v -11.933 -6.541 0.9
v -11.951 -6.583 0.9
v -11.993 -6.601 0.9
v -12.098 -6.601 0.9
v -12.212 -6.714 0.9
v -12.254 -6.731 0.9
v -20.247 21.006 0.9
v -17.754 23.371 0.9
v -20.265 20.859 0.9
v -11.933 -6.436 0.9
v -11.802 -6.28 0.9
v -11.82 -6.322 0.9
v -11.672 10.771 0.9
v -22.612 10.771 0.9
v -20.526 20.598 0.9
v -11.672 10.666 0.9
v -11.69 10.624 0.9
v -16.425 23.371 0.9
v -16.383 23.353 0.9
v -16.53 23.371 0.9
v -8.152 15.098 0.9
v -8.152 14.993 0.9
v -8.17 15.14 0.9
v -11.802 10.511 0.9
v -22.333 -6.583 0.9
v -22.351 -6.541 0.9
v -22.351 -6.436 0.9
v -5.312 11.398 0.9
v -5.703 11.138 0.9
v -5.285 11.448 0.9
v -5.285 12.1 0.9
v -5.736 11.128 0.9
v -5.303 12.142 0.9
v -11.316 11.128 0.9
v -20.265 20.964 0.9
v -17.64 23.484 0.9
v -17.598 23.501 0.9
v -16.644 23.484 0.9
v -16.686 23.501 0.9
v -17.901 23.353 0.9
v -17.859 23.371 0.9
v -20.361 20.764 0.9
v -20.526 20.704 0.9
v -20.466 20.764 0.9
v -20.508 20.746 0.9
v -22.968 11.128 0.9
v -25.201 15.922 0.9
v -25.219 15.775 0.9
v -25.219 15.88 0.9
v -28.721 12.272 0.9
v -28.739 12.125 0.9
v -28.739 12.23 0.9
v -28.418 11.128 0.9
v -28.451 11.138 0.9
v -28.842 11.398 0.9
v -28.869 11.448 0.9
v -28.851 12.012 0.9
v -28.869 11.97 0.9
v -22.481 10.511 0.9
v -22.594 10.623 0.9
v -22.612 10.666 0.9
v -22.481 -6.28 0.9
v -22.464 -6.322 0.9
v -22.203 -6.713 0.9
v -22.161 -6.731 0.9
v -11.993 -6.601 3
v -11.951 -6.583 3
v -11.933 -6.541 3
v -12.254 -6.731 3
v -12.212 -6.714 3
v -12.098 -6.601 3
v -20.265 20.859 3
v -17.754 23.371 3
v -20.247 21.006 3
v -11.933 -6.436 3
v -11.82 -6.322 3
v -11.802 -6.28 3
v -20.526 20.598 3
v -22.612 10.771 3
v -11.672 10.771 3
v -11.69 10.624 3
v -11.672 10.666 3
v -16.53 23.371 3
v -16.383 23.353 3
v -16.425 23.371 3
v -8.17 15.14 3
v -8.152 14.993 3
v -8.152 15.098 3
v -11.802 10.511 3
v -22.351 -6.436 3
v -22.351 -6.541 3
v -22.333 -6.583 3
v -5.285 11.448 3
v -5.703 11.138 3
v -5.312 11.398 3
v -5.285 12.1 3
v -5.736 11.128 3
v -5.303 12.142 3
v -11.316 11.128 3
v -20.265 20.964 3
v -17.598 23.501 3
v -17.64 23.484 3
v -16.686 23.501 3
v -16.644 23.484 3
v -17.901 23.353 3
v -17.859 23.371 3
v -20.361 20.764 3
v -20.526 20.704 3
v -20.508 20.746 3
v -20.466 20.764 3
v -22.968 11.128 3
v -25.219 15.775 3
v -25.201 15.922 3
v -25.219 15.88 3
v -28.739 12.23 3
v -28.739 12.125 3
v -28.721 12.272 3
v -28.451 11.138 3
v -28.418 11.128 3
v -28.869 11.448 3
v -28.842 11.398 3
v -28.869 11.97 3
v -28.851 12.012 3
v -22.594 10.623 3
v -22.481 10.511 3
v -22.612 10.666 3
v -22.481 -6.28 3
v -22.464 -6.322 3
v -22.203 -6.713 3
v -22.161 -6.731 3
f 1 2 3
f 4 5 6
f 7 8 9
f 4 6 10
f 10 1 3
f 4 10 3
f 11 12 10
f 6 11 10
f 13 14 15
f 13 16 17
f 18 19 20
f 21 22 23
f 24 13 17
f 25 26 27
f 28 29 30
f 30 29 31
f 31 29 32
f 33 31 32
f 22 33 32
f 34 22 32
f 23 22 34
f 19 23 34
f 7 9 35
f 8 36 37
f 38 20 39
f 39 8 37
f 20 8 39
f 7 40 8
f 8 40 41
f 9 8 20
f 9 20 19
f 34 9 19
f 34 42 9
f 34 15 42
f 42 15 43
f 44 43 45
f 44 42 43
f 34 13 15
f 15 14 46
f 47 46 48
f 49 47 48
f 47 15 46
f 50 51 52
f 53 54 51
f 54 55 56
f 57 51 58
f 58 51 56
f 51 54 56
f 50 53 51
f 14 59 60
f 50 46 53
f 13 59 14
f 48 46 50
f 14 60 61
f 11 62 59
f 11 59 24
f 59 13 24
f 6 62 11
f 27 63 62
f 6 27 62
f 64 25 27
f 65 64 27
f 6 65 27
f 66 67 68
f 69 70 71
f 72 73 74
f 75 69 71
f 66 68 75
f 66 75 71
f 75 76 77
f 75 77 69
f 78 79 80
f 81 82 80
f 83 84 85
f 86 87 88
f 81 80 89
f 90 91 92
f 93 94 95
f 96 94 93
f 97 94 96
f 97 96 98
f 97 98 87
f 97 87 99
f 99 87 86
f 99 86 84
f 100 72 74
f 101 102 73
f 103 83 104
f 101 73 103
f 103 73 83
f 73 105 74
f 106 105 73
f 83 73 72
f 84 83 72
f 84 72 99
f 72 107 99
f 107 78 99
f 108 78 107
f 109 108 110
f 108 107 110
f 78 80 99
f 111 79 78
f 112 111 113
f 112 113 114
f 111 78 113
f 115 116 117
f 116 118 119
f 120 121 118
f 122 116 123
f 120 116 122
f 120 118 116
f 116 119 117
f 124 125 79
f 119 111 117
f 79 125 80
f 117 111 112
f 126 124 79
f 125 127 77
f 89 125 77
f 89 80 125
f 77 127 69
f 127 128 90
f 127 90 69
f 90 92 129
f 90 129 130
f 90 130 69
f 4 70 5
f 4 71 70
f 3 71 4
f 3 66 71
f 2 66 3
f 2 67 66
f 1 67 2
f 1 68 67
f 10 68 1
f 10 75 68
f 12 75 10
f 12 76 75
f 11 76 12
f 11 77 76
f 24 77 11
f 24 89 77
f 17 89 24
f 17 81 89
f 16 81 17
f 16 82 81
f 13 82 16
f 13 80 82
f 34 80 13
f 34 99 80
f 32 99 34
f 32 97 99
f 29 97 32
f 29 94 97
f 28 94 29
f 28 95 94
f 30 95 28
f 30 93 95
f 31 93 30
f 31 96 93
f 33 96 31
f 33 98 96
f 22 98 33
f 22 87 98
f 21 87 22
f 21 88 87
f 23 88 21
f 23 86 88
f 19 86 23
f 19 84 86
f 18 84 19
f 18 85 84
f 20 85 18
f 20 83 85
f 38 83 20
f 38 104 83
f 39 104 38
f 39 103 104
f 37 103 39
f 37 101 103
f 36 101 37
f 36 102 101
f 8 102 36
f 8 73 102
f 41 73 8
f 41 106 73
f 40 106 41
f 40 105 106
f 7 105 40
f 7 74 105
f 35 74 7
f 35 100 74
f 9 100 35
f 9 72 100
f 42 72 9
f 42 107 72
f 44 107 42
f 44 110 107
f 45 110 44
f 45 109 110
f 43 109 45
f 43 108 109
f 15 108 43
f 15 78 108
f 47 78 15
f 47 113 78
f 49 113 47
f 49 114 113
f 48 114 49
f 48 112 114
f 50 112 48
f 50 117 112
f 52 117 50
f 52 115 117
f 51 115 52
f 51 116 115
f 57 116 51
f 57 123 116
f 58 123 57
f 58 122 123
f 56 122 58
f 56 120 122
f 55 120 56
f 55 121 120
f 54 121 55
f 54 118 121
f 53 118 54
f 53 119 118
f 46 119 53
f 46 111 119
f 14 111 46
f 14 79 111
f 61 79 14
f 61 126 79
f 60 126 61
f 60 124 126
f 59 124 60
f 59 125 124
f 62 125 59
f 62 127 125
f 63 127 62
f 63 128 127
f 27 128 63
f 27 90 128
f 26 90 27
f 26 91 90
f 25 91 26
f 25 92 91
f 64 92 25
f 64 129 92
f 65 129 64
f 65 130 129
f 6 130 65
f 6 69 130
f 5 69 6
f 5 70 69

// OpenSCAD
$fn = 24;
translate([0, -2.500, 0.900])
  linear_extrude(height=2.100) {
offset(r=0.06, $fn=8) {
    polygon(points=[[-17.598,25.941],[-17.729,25.811],[-17.859,25.811],[-20.205,23.464],[-20.205,23.334],[-20.336,23.204],[-20.466,23.204],[-20.466,23.073],[-25.159,18.380],[-25.159,18.250],[-28.679,14.730],[-28.679,14.600],[-28.809,14.470],[-28.809,13.948],[-28.418,13.688],[-22.943,13.688],[-22.552,13.296],[-22.552,13.166],[-22.421,13.036],[-22.421,-3.780],[-22.291,-3.911],[-22.291,-4.041],[-22.161,-4.171],[-12.254,-4.171],[-12.123,-4.041],[-11.993,-4.041],[-11.993,-3.911],[-11.862,-3.780],[-11.862,13.036],[-11.732,13.166],[-11.732,13.296],[-11.341,13.688],[-5.736,13.688],[-5.345,13.948],[-5.345,14.600],[-8.212,17.468],[-8.212,17.598],[-16.425,25.811],[-16.555,25.811],[-16.686,25.941]], paths=[[0,1,2,3,4,5,6,7,8,9,10,11,12,13,14,15,16,17,18,19,20,21,22,23,24,25,26,27,28,29,30,31,32,33,34,35,36,37,38,39]]);
}
}
